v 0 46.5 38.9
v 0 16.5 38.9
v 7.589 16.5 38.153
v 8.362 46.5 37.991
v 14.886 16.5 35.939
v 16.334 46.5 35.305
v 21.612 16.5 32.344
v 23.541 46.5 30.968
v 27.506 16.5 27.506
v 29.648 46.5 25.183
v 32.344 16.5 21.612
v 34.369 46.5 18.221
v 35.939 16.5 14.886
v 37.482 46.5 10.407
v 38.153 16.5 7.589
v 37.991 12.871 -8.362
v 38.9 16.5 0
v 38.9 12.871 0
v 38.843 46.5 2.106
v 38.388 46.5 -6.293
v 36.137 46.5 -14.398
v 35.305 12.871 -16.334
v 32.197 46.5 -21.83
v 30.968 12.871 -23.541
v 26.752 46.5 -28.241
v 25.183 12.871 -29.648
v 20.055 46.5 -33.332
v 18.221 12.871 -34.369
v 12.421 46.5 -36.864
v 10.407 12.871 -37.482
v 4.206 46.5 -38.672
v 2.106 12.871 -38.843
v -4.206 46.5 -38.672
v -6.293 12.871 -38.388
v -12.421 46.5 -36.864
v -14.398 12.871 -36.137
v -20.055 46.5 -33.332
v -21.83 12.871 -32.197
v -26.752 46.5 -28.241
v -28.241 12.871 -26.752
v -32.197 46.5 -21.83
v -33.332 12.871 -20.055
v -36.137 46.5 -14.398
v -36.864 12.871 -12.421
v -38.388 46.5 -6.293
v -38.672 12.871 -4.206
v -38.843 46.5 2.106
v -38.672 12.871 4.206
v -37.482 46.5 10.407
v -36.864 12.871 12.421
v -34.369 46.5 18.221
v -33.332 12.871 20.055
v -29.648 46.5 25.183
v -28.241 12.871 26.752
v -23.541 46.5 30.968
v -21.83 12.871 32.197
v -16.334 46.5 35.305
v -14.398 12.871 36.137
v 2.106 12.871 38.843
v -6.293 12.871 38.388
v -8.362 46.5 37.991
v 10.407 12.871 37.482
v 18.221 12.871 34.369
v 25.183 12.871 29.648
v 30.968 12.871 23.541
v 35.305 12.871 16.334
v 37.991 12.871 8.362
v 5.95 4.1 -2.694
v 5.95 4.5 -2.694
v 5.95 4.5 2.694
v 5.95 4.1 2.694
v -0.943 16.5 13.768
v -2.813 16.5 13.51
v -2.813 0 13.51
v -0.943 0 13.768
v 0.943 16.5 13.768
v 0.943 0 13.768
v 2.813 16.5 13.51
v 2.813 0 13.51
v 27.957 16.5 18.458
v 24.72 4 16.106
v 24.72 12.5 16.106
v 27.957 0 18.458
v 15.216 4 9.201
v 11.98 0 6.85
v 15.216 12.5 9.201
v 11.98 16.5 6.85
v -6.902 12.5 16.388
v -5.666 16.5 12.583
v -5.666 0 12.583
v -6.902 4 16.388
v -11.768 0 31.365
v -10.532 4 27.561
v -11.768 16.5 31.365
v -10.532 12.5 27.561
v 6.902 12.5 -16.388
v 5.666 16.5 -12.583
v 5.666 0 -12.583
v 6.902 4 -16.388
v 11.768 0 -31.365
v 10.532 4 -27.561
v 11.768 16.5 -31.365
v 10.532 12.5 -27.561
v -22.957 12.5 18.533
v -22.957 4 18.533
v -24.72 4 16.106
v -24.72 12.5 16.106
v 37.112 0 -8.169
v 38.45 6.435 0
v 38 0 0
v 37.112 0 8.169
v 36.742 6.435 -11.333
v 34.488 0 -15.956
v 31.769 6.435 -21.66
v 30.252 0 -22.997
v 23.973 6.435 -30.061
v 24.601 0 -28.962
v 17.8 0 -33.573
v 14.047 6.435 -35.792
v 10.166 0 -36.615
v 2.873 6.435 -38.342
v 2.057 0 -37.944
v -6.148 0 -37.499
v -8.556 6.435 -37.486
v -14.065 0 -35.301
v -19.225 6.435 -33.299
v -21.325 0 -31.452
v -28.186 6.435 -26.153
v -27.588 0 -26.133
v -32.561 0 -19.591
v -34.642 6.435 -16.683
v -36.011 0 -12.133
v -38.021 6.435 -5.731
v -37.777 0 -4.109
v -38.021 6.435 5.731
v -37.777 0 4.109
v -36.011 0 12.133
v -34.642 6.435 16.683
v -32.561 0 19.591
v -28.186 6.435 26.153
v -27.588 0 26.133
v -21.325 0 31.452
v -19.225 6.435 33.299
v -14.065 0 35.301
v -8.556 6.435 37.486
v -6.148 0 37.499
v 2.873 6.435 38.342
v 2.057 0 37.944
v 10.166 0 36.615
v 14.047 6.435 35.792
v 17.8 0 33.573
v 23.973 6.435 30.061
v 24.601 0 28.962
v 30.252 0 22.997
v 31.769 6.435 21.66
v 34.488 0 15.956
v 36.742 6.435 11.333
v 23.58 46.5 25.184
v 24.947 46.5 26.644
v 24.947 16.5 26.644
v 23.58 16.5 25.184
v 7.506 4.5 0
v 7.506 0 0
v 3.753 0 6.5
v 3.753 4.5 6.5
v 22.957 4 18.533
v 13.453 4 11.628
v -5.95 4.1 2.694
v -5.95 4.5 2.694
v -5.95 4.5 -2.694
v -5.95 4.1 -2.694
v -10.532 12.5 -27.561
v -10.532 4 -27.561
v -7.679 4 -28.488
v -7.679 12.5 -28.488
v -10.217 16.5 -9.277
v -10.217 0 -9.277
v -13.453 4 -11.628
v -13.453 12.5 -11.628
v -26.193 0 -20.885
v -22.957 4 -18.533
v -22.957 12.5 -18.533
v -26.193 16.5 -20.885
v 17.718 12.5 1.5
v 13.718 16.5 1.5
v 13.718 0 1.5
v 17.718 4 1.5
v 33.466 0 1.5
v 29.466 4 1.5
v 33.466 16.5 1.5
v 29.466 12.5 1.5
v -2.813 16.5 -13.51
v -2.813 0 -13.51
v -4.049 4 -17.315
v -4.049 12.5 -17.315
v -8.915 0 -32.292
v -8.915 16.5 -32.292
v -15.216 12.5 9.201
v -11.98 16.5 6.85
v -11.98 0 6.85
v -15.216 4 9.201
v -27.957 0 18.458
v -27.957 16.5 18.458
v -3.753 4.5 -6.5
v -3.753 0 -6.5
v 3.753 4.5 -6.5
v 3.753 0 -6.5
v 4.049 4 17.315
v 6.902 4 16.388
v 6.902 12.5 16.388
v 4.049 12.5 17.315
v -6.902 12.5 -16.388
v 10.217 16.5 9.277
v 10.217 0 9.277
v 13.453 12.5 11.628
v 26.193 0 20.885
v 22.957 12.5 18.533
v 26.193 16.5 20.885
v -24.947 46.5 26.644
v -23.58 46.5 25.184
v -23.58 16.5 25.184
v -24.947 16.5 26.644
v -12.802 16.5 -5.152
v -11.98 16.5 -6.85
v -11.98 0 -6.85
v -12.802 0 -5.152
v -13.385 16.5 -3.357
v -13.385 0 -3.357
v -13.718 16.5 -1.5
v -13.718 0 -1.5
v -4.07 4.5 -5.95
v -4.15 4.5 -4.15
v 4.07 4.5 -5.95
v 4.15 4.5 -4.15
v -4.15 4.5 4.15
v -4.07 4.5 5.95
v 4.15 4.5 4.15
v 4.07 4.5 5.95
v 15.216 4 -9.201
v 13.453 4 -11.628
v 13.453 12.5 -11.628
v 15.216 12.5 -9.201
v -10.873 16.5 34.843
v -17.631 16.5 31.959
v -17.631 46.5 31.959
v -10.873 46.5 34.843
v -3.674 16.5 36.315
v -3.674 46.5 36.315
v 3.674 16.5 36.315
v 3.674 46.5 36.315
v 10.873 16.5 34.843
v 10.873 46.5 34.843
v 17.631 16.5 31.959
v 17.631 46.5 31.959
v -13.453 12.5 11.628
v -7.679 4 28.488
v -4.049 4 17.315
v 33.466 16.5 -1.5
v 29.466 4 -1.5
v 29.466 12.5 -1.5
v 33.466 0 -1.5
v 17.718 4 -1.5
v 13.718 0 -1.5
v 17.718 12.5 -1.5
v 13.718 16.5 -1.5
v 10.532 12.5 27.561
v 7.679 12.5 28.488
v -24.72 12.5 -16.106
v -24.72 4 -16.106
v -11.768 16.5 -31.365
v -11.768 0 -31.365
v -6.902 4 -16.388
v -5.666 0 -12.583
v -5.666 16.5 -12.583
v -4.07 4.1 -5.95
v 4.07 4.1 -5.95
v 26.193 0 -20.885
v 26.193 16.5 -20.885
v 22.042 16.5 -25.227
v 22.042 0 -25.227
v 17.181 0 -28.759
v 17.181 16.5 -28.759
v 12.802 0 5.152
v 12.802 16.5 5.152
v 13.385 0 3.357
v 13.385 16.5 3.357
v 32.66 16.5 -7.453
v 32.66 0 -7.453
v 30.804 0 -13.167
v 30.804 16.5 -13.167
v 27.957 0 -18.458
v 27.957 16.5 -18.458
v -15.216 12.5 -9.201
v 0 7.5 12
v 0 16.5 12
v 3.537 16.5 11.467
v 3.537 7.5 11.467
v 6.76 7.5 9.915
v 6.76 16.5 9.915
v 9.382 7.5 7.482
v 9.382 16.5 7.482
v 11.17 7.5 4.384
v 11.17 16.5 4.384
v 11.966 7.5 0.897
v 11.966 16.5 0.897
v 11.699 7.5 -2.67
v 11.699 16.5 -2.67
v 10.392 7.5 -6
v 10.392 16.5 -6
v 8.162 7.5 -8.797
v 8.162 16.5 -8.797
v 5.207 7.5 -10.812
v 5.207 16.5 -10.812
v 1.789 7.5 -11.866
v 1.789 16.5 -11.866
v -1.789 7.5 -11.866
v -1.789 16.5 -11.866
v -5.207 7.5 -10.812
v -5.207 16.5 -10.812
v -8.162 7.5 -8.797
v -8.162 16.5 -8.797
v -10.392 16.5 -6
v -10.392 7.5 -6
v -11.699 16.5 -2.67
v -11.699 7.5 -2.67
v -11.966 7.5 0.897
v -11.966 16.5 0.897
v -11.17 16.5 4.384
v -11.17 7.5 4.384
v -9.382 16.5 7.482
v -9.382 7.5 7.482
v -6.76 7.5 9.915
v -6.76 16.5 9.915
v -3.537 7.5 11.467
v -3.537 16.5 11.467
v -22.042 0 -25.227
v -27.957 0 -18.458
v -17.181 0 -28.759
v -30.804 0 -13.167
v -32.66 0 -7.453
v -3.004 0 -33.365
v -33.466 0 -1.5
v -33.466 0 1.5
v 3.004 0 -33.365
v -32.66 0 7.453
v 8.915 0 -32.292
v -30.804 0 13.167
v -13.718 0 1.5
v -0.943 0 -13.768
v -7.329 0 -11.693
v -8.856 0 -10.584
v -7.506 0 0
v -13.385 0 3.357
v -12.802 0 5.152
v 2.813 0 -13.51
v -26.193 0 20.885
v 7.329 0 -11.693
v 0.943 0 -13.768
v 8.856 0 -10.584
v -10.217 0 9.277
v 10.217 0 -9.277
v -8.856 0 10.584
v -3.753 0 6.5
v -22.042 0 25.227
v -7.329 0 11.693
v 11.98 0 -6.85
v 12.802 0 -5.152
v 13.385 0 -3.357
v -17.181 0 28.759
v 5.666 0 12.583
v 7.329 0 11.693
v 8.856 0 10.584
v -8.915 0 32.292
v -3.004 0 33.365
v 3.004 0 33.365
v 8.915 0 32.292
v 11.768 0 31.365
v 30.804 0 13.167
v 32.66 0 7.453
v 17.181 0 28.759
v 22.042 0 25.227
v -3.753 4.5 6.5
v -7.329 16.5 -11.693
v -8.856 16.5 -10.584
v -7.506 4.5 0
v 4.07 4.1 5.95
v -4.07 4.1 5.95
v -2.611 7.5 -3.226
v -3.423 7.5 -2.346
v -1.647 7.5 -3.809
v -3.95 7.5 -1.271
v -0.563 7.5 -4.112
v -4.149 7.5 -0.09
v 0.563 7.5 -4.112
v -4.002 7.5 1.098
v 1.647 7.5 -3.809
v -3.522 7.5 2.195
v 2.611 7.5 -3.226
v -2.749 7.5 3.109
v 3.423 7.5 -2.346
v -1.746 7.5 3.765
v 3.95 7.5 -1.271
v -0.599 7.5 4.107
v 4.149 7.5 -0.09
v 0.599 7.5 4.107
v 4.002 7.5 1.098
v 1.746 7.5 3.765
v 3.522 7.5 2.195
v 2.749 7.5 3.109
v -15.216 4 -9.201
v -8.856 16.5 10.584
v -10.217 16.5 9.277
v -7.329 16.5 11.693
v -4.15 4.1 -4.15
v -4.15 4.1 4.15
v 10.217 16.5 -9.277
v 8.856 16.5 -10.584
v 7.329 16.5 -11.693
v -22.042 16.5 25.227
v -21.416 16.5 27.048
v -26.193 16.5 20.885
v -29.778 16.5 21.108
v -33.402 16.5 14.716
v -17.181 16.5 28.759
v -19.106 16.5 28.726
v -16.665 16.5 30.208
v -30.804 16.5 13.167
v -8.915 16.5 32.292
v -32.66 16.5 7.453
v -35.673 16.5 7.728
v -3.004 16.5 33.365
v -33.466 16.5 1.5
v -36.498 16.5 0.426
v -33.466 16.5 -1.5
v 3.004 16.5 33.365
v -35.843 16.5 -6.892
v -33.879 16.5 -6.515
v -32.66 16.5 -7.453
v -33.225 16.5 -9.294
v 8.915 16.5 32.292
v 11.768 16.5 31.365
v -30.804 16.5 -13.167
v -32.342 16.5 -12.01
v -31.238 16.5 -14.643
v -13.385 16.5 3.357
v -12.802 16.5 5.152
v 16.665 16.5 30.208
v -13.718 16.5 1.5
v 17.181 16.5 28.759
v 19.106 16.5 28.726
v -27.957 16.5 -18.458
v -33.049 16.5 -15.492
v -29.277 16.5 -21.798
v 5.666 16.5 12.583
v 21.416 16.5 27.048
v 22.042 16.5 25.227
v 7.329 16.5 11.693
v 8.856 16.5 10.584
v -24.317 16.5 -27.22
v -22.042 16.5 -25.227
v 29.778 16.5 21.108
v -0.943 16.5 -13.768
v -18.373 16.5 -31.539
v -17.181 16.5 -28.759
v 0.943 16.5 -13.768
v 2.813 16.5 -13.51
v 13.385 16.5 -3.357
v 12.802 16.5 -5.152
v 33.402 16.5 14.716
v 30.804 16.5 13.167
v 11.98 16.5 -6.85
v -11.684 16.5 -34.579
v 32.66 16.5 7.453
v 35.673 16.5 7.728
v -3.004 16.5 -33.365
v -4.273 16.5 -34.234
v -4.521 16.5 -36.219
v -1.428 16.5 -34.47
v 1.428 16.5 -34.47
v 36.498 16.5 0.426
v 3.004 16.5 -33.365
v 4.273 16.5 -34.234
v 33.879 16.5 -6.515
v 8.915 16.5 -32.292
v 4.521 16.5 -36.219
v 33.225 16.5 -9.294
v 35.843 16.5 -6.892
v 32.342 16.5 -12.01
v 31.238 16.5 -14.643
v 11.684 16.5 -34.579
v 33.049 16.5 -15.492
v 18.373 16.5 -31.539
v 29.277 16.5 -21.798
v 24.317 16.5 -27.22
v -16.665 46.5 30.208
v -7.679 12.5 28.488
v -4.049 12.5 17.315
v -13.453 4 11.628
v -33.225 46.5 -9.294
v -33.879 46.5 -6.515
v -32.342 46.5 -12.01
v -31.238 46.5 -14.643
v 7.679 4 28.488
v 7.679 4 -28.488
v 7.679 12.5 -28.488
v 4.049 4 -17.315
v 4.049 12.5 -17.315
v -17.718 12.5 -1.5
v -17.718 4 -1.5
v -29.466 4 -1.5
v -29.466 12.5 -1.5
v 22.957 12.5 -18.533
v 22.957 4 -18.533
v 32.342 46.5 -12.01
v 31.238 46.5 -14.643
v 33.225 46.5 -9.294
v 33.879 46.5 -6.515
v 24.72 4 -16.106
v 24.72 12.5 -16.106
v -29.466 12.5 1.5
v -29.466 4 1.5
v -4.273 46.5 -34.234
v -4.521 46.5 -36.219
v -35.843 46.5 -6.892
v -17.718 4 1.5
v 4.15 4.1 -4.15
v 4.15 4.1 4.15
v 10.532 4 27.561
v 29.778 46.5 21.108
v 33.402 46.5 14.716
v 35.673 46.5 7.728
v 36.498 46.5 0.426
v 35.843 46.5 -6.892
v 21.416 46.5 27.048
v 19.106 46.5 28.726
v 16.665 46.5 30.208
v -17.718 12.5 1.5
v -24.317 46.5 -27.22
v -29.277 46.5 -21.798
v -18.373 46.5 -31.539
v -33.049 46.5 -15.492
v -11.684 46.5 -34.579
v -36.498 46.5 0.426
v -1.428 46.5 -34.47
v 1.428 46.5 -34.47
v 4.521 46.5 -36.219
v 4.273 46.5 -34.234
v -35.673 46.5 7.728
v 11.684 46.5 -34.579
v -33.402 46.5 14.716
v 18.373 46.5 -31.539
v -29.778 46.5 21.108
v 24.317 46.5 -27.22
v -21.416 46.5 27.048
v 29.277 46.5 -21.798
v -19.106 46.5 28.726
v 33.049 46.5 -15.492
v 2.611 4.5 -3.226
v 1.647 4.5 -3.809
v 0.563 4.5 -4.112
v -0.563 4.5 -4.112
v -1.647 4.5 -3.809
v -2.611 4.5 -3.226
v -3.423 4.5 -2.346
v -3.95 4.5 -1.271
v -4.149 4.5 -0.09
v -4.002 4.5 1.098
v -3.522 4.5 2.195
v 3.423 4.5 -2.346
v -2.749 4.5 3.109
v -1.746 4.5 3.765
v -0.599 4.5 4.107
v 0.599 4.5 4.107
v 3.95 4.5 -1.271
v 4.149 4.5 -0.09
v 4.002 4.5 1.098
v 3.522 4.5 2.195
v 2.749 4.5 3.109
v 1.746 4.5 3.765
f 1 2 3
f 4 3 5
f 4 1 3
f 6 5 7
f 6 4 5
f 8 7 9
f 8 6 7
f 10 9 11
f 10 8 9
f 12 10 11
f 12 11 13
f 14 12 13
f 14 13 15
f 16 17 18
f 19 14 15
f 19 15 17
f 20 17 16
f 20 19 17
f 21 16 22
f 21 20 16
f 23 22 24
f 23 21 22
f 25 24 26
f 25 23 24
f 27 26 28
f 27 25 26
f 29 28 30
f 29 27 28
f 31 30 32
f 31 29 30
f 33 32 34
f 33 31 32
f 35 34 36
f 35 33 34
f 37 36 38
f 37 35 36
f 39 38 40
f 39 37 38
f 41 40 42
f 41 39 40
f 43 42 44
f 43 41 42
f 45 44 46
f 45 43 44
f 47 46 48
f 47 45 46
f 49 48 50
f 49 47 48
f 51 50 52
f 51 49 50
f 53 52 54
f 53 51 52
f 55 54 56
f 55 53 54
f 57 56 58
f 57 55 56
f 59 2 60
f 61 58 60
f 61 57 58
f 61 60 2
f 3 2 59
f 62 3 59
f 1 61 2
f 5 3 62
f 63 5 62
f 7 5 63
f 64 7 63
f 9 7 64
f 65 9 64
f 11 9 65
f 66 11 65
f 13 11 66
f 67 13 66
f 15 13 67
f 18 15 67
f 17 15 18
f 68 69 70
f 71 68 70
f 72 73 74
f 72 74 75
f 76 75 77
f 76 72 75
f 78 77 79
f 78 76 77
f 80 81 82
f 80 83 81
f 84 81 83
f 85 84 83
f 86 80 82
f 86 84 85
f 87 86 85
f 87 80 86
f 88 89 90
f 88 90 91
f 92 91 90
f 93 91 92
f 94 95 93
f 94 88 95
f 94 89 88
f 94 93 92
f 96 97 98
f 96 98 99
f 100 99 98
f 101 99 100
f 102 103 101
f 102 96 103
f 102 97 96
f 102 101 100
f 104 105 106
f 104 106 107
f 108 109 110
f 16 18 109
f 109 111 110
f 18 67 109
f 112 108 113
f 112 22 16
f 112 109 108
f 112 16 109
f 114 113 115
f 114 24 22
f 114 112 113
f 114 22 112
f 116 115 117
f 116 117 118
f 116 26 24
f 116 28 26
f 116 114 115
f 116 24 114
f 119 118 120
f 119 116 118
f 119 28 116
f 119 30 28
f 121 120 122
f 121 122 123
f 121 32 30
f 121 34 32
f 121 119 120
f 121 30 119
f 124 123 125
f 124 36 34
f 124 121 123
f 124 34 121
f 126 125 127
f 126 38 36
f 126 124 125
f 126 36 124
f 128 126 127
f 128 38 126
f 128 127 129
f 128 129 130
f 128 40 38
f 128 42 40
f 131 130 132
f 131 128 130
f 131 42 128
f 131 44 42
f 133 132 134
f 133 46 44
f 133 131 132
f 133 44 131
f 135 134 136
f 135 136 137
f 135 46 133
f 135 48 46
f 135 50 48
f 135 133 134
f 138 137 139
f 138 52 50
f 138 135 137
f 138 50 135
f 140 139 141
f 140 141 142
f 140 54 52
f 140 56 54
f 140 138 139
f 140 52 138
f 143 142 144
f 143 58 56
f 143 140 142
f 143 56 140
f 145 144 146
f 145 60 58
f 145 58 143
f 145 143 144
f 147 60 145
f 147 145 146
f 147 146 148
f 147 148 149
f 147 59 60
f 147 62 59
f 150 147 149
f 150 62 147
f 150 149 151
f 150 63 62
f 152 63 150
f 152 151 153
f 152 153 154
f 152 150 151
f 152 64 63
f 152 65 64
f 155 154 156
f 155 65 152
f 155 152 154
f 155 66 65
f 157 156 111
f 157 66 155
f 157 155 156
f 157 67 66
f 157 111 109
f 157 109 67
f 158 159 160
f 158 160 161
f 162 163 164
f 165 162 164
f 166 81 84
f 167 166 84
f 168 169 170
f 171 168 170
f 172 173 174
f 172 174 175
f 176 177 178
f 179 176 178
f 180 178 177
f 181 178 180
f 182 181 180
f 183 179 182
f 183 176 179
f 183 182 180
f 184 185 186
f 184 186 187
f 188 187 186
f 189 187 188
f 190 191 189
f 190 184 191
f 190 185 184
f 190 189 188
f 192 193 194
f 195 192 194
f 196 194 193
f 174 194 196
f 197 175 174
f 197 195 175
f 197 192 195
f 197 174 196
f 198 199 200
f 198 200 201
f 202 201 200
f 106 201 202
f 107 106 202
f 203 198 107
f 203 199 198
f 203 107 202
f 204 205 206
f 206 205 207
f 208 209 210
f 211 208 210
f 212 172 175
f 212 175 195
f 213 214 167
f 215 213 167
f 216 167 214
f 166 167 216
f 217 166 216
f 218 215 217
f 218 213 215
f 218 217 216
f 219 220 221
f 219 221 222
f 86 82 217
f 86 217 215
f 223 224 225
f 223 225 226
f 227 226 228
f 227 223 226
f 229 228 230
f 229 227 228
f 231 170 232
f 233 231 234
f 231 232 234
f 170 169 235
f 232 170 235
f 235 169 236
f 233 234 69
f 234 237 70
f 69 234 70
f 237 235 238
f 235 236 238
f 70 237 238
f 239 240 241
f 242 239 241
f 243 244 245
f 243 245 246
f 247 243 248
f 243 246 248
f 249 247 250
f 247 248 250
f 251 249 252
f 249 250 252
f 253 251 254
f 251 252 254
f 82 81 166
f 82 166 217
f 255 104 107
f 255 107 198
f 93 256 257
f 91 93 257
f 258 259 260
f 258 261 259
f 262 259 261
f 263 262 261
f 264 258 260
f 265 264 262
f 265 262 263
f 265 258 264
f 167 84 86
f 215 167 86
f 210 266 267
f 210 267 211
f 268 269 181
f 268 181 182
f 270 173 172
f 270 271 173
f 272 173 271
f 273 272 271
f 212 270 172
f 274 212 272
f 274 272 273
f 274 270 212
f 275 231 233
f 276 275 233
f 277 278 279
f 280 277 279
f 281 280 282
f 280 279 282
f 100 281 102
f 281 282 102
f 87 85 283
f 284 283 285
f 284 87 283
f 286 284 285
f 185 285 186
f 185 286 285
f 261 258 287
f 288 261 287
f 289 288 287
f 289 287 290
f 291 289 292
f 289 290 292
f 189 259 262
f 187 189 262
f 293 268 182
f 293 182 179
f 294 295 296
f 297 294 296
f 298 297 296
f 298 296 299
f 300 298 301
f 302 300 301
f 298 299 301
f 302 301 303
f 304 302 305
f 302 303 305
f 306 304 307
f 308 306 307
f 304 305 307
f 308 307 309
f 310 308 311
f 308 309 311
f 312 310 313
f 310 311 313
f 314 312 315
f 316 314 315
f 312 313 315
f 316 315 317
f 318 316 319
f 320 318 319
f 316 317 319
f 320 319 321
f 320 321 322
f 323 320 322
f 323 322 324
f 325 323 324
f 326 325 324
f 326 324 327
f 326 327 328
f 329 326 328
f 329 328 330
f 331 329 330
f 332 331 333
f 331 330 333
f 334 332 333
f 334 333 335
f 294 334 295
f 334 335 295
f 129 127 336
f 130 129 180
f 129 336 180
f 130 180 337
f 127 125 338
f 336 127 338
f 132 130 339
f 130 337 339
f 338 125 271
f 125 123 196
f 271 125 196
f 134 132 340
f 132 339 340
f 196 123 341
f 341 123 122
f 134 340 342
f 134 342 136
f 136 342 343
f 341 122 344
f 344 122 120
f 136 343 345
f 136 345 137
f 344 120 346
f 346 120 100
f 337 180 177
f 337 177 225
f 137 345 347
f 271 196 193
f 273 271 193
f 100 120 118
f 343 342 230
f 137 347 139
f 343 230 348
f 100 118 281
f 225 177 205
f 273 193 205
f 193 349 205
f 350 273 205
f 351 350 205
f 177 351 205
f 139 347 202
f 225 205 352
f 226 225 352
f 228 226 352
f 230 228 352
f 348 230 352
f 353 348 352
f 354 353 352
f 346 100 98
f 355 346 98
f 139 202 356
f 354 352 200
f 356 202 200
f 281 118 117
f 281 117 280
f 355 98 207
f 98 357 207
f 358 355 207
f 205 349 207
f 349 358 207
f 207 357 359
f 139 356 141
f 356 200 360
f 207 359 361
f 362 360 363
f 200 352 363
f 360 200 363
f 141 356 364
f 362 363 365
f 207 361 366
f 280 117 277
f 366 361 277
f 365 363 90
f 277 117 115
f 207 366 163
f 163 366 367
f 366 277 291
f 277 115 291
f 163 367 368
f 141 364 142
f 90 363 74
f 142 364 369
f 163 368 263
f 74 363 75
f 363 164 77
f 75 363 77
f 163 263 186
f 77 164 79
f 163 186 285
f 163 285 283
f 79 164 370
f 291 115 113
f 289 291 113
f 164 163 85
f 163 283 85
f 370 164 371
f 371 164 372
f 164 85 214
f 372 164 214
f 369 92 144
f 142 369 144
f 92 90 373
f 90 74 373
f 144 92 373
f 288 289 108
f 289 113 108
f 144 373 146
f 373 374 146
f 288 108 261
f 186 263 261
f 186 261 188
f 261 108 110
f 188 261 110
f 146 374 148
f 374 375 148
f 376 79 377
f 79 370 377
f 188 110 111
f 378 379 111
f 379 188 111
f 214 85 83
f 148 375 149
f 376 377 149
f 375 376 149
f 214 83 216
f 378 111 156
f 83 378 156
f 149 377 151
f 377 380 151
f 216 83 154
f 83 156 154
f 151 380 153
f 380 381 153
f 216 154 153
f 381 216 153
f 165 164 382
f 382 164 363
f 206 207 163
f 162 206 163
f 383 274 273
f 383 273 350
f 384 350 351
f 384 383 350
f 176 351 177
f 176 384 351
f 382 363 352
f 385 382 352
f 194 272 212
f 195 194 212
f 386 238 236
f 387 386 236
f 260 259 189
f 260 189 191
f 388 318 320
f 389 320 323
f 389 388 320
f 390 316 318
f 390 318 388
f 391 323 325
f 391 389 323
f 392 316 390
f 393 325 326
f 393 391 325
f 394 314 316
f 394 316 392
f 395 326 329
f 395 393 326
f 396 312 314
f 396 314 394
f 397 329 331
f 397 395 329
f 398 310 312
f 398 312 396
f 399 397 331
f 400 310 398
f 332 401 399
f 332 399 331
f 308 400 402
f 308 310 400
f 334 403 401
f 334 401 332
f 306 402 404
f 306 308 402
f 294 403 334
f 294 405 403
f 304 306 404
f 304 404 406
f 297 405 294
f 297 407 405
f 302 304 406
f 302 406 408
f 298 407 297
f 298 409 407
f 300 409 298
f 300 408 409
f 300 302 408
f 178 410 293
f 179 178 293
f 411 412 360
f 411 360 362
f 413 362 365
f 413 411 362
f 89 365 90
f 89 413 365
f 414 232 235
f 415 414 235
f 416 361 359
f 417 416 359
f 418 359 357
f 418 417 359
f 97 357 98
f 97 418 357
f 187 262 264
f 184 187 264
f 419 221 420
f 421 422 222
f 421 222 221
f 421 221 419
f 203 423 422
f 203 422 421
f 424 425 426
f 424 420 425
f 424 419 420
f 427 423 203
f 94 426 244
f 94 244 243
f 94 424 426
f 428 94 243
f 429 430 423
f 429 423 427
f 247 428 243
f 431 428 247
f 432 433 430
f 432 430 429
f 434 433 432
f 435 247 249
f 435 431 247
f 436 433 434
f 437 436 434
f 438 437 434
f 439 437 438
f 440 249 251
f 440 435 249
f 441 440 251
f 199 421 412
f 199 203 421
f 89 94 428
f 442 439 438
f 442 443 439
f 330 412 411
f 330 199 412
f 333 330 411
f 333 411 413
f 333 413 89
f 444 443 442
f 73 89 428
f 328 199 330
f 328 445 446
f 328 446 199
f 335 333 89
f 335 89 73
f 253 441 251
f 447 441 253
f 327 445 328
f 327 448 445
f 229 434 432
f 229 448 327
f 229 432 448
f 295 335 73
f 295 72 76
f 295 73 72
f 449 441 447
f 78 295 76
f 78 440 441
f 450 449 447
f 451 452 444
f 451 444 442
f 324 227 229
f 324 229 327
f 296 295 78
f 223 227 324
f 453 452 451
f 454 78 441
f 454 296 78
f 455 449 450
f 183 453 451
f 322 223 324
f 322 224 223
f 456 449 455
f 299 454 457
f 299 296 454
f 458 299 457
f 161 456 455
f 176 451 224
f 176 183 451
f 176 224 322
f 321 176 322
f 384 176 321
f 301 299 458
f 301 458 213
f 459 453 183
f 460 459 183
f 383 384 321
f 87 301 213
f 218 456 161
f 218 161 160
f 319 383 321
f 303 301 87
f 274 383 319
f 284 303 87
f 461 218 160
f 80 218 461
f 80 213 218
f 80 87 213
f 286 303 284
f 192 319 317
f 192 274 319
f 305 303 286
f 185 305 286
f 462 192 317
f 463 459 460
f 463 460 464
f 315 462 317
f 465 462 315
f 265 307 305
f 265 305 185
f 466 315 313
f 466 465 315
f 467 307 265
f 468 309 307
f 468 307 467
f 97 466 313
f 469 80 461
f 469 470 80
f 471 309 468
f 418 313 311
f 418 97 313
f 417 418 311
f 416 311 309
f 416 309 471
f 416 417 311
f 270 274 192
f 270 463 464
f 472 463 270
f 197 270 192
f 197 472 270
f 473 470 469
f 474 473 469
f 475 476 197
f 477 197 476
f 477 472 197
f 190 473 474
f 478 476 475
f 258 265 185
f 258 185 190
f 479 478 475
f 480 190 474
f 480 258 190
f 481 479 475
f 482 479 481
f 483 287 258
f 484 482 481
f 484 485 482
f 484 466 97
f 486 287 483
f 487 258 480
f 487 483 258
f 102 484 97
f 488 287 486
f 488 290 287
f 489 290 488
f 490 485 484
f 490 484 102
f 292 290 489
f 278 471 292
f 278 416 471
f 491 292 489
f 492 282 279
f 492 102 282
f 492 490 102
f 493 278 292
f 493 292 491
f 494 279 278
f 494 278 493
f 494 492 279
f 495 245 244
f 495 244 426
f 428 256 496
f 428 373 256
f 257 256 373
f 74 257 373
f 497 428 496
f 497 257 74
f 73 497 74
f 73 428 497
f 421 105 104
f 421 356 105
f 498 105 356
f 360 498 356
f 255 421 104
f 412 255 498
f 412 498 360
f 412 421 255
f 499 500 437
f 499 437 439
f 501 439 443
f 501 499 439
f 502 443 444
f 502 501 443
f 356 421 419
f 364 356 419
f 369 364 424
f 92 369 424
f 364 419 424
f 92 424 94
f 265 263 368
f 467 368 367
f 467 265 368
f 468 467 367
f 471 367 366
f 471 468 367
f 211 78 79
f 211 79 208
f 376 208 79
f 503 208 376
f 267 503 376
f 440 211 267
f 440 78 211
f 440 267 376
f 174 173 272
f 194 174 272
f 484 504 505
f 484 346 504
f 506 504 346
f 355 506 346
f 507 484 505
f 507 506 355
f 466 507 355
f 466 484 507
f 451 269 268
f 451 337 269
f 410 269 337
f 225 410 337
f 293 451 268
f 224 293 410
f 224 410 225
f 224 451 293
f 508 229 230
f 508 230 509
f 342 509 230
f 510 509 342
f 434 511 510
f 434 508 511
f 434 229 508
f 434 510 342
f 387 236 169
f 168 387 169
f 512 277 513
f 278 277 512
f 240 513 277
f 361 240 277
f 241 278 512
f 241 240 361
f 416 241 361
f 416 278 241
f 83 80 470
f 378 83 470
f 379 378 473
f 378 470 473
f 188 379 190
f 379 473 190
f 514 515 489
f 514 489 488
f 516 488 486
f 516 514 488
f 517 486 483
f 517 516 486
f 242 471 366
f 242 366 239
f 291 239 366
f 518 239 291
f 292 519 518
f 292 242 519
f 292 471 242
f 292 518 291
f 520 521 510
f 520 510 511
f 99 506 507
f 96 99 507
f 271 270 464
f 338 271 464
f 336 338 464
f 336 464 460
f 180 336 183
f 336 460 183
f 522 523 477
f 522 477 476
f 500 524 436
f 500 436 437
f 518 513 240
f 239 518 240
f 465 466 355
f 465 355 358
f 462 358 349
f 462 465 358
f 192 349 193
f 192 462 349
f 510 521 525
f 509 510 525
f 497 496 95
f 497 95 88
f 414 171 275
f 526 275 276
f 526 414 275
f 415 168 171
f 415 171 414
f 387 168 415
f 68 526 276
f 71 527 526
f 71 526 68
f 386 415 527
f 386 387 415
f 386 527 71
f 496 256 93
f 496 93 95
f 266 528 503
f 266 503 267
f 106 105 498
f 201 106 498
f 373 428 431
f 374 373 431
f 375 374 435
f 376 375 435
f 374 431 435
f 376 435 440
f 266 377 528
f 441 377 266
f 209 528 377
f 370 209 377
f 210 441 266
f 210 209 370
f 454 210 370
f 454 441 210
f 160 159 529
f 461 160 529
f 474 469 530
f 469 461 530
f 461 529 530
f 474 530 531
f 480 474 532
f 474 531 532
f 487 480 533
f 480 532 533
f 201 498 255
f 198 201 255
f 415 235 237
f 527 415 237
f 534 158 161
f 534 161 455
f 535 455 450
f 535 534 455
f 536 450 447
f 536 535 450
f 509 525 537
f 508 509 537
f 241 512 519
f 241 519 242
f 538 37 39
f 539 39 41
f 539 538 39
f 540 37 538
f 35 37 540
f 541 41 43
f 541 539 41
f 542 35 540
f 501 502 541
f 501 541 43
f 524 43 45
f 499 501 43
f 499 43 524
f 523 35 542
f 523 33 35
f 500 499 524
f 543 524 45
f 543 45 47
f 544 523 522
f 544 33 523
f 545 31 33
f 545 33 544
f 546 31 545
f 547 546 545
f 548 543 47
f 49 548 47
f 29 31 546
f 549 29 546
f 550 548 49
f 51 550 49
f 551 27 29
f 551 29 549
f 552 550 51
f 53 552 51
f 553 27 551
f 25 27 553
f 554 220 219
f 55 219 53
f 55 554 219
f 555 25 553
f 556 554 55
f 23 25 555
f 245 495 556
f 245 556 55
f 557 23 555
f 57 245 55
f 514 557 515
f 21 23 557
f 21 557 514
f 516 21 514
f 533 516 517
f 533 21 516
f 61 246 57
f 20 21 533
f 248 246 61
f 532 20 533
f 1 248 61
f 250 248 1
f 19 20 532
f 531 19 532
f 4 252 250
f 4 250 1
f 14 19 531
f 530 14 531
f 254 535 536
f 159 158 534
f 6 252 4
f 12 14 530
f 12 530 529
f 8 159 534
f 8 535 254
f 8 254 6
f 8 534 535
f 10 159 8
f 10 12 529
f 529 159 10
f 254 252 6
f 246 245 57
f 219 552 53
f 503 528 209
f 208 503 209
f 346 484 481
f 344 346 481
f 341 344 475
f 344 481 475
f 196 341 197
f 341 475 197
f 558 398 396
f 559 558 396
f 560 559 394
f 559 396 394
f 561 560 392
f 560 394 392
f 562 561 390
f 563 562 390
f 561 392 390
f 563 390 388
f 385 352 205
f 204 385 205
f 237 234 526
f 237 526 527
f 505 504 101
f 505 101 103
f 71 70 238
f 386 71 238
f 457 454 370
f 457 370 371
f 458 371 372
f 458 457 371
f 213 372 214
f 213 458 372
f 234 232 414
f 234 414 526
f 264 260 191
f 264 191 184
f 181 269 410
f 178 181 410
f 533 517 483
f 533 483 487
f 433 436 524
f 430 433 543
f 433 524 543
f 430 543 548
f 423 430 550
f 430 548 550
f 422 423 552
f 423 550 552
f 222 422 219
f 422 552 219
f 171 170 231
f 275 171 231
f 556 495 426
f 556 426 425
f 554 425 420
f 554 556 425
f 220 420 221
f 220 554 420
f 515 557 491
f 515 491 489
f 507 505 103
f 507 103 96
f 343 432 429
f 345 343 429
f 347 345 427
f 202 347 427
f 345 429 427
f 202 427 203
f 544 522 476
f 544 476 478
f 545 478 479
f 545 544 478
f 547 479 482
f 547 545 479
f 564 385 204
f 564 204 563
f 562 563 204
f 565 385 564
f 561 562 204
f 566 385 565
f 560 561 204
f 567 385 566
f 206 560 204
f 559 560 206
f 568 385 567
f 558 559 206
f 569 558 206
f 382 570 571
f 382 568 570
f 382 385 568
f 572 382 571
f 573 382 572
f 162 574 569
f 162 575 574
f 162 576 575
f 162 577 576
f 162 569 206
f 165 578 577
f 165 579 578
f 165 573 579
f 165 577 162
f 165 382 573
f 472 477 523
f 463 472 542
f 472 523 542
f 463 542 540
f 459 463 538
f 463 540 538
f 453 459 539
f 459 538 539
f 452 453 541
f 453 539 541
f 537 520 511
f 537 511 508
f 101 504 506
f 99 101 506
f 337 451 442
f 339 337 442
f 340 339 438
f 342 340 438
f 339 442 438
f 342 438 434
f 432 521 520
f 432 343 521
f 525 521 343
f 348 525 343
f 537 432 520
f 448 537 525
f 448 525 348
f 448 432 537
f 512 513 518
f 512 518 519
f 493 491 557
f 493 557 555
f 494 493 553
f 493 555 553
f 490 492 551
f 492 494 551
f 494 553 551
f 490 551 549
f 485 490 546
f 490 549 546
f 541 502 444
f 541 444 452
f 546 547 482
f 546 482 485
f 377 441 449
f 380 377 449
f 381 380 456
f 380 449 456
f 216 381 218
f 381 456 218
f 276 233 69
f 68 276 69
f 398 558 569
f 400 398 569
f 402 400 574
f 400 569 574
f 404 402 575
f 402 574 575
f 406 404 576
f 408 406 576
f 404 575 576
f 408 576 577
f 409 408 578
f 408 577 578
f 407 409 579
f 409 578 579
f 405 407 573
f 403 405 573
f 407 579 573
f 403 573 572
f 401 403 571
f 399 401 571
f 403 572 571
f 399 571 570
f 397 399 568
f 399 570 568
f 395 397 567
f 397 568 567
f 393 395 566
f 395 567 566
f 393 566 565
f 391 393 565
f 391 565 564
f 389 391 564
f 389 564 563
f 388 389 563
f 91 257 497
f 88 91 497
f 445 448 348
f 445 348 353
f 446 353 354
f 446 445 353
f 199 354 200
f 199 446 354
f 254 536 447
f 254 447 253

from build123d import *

# Parameters (mm, degrees)
BOSS_EXTRUDE1_DEPTH    = 16.5
SKETCH1_3_R            = 38
BOSS_EXTRUDE2_DEPTH    = 29.5
CHAMFER1_SIZE          = 1
CUT_EXTRUDE1_DEPTH     = 4.5
SKETCH3_R              = 12
CUT_EXTRUDE2_DEPTH     = 9
SKETCH4_R              = 4.15
CUT_EXTRUDE3_DEPTH     = 57.216100896
SKETCH5_R              = 33.5
SKETCH5_R_2            = 13.8
CUT_EXTRUDE4_DEPTH     = 57.216100896
SKETCH8_W              = 8.3
SKETCH8_H              = 8.3
BOSS_EXTRUDE5_DEPTH    = 0.4
BOSS_EXTRUDE6_DEPTH    = 16.5
SKETCH6_W              = 11.748165023
SKETCH6_H              = 8.5
CUT_EXTRUDE5_DEPTH     = 3
CIRPATTERN1_COUNT      = 10
CIRPATTERN1_2_COUNT    = 10
INTERSECT1_START       = 16.5
INTERSECT1_OUTLINE_R   = 38
INTERSECT1_OUTLINE_R_2 = 35
INTERSECT1_DEPTH       = 13
SKETCH9_R              = 38.9
SKETCH9_R_2            = 36.5
ADAPTER_WALL_DEPTH     = 30
GROOVE_DEPTH           = 30
CIRPATTERN2_COUNT      = 5


# Read off the part's stored shape, not the designer's step: Intersect1, Draft4
with BuildPart() as part:
    # Sketch1 → Boss-Extrude1 (new body)
    with BuildSketch(Plane(origin=(0, 0, 0), x_dir=(1, 0, 0), z_dir=(0, 1, 0))):
        with BuildLine():
            ThreePointArc((-35, 0), (-23.807565896, -25.655405007), (2.611417491, -34.902442589))
            ThreePointArc((2.611417491, -34.902442589), (25.1391934, -24.352021583), (34.967837614, -1.50011086))
            ThreePointArc((34.967837614, -1.50011086), (26.159850954, 23.252143945), (2.611487723, 34.902437334))
            ThreePointArc((2.611487723, 34.902437334), (-23.807540084, 25.65542896), (-35, 0))
        make_face()
        with BuildLine():
            Line((-2.610578379, 3.226047199), (0, 3.226047199))
            Line((0, 3.226047199), (2.610578379, 3.226047199))
            ThreePointArc((2.610578379, 3.226047199), (0, -4.15), (-2.610578379, 3.226047199))
        make_face(mode=Mode.SUBTRACT)
    extrude(amount=BOSS_EXTRUDE1_DEPTH)

    # Sketch1<3> → Boss-Extrude2 (add)
    with BuildSketch(Plane(origin=(0, 0, 0), x_dir=(1, 0, 0), z_dir=(0, 1, 0))):
        with Locations(Location((0, 0, 0), (0, 0, 270))):
            Circle(SKETCH1_3_R)
        with BuildLine():
            ThreePointArc((34.967837614, -1.50011086), (25.1391934, -24.352021583), (2.611417491, -34.902442589))
            ThreePointArc((2.611417491, -34.902442589), (-23.807565896, -25.655405007), (-35, 0))
            ThreePointArc((-35, 0), (-23.807540084, 25.65542896), (2.611487723, 34.902437334))
            ThreePointArc((2.611487723, 34.902437334), (25.65542896, 23.807540084), (35, 0))
            ThreePointArc((35, 0), (34.99195848, -0.7502278), (34.967837614, -1.50011086))
        make_face(mode=Mode.SUBTRACT)
    extrude(amount=BOSS_EXTRUDE2_DEPTH)

    # Chamfer1
    chamfer1_edges = [part.edges().sort_by_distance(p)[0] for p in [
        (0, 0, -3.226047199),
        (0, 0, 4.15),
    ]]
    chamfer(chamfer1_edges, length=CHAMFER1_SIZE)

    # Sketch2 → Cut-Extrude1 (cut)
    with BuildSketch(Plane.XZ):
        Polygon((-3.75277675, 6.5), (-7.505553499, 0), (-3.75277675, -6.5), (3.75277675, -6.5), (7.505553499, 0), (3.75277675, 6.5), align=None)
    extrude(amount=-CUT_EXTRUDE1_DEPTH, mode=Mode.SUBTRACT)

    # Sketch3 → Cut-Extrude2 (cut)
    with BuildSketch(Plane(origin=(0, 16.5, 0), x_dir=(1, 0, 0), z_dir=(0, 1, 0))):
        with Locations(Location((0, 0, 0), (0, 0, 270))):
            Circle(SKETCH3_R)
    extrude(amount=-CUT_EXTRUDE2_DEPTH, mode=Mode.SUBTRACT)

    # Sketch4 → Cut-Extrude3 (cut, through all)
    with BuildSketch(Plane(origin=(0, 16.5, 0), x_dir=(1, 0, 0), z_dir=(0, 1, 0))):
        with Locations(Location((0, 0, 0), (0, 0, 90))):
            Circle(SKETCH4_R)
    extrude(amount=-CUT_EXTRUDE3_DEPTH, mode=Mode.SUBTRACT)

    # Sketch5 → Cut-Extrude4 (cut, through all)
    with BuildSketch(Plane(origin=(0, 16.5, 0), x_dir=(1, 0, 0), z_dir=(0, 1, 0))):
        with Locations(Location((0, 0, 0), (0, 0, 270))):
            Circle(SKETCH5_R)
        with Locations(Location((0, 0, 0), (0, 0, 270))):
            Circle(SKETCH5_R_2, mode=Mode.SUBTRACT)
    extrude(amount=-CUT_EXTRUDE4_DEPTH, mode=Mode.SUBTRACT)


with BuildPart() as cut_extrude4_piece_1:
    # of the separate pieces the step leaves, piece 1, a body of its own (cut_extrude4_pieces)
    add(part.part.solids().sort_by_distance((0, 0, 38))[0])

    # Sketch5<3> → Boss-Extrude6 (add)
    with BuildSketch(Plane(origin=(0, 16.5, 0), x_dir=(1, 0, 0), z_dir=(0, 1, 0))):
        with BuildLine():
            Line((33.5, 0), (13.8, 0))
            ThreePointArc((13.8, 0), (13.779543848, -0.751113398), (13.718236038, -1.5))
            Line((13.718236038, -1.5), (33.466401061, -1.5))
            ThreePointArc((33.466401061, -1.5), (33.491599212, -0.750188125), (33.5, 0))
        make_face()
        with BuildLine():
            ThreePointArc((13.718236038, 1.5), (13.779543848, 0.751113398), (13.8, 0))
            Line((13.8, 0), (33.5, 0))
            ThreePointArc((33.5, 0), (33.491599212, 0.750188125), (33.466401061, 1.5))
            Line((33.466401061, 1.5), (13.718236038, 1.5))
        make_face()
    boss_extrude6 = extrude(amount=-BOSS_EXTRUDE6_DEPTH)

    # Sketch6 → Cut-Extrude5 (cut)
    with BuildSketch(Plane(origin=(-0.880879479, 0, -1.5), x_dir=(-1, 0, 0), z_dir=(0, 0, -1))):
        with Locations((-24.473198029, 8.25)):
            Rectangle(SKETCH6_W, SKETCH6_H)
    cut_extrude5 = extrude(amount=-CUT_EXTRUDE5_DEPTH, mode=Mode.SUBTRACT)

    # CirPattern1: Boss-Extrude6 ×10 about axis
    cirpattern1_axis = Axis((0, 0, 0), (0, 1, 0))
    for i in range(1, CIRPATTERN1_COUNT):
        add(boss_extrude6.rotate(cirpattern1_axis, i * 360 / CIRPATTERN1_COUNT))

    # CirPattern1 2: Cut-Extrude5 ×10 about axis
    cirpattern1_2_axis = Axis((0, 0, 0), (0, 1, 0))
    for i in range(1, CIRPATTERN1_2_COUNT):
        add(cut_extrude5.rotate(cirpattern1_2_axis, i * 360 / CIRPATTERN1_2_COUNT), mode=Mode.SUBTRACT)

    # Intersect1 outline → Intersect1 (cut)
    with BuildSketch(Plane(origin=(0, 0, 0), x_dir=(1, 0, 0), z_dir=(0, 1, 0)).offset(INTERSECT1_START)):
        Circle(INTERSECT1_OUTLINE_R)
        Circle(INTERSECT1_OUTLINE_R_2, mode=Mode.SUBTRACT)
    extrude(amount=INTERSECT1_DEPTH, mode=Mode.SUBTRACT)


with BuildPart() as cut_extrude4_piece_2:
    # of the separate pieces the step leaves, piece 2, a body of its own (cut_extrude4_pieces)
    add(part.part.solids().sort_by_distance((2.610578379, 4.5, -3.226047199))[0])


    add(cut_extrude4_piece_1.part)  # Adapter_Wall merges Cut-Extrude4 piece 1
    # Sketch9 → Adapter_Wall (add)
    with BuildSketch(Plane(origin=(0, 46.5, 0), x_dir=(1, 0, 0), z_dir=(0, 1, 0))):
        with Locations(Location((0, 0, 0), (0, 0, 270))):
            Circle(SKETCH9_R)
        with Locations(Location((0, 0, 0), (0, 0, 270))):
            Circle(SKETCH9_R_2, mode=Mode.SUBTRACT)
    extrude(amount=-ADAPTER_WALL_DEPTH)

    # Sketch9<3> → Groove (add)
    with BuildSketch(Plane(origin=(0, 46.5, 0), x_dir=(1, 0, 0), z_dir=(0, 1, 0))):
        with BuildLine():
            ThreePointArc((4.521096859, 36.218913335), (0, 36.5), (-4.521096859, 36.218913335))
            Line((-4.521096859, 36.218913335), (-4.273365524, 34.234315344))
            ThreePointArc((-4.273365524, 34.234315344), (0, 34.5), (4.273365524, 34.234315344))
            Line((4.273365524, 34.234315344), (4.521096859, 36.218913335))
        make_face()
    groove = extrude(amount=-GROOVE_DEPTH)

    # CirPattern2: Groove ×5 about axis
    cirpattern2_axis = Axis((0, 0, 0), (0, 1, 0))
    for i in range(1, CIRPATTERN2_COUNT):
        add(groove.rotate(cirpattern2_axis, i * 360 / CIRPATTERN2_COUNT))

    # Draft4 outline → Draft4 (revolve)
    with BuildSketch(Plane.XY):
        Polygon((38, 16.5), (38, 0), (38.9, 12.870599631), (38.9, 16.5), align=None)
    revolve(axis=Axis((0, 0, 0), (0, 1, 0)))


with BuildPart() as body_3:
    # Sketch8 → Boss-Extrude5 (new body)
    with BuildSketch(Plane.XZ.offset(-4.5)):
        Polygon((4.070319398, -5.95), (5.95, -2.694297695), (5.95, 2.694297695), (4.070319398, 5.95), (-4.070319398, 5.95), (-5.95, 2.694297695), (-5.95, -2.694297695), (-4.070319398, -5.95), align=None)
        Rectangle(SKETCH8_W, SKETCH8_H, mode=Mode.SUBTRACT)
    extrude(amount=BOSS_EXTRUDE5_DEPTH)


solid = Compound([cut_extrude4_piece_2.part, body_3.part])
